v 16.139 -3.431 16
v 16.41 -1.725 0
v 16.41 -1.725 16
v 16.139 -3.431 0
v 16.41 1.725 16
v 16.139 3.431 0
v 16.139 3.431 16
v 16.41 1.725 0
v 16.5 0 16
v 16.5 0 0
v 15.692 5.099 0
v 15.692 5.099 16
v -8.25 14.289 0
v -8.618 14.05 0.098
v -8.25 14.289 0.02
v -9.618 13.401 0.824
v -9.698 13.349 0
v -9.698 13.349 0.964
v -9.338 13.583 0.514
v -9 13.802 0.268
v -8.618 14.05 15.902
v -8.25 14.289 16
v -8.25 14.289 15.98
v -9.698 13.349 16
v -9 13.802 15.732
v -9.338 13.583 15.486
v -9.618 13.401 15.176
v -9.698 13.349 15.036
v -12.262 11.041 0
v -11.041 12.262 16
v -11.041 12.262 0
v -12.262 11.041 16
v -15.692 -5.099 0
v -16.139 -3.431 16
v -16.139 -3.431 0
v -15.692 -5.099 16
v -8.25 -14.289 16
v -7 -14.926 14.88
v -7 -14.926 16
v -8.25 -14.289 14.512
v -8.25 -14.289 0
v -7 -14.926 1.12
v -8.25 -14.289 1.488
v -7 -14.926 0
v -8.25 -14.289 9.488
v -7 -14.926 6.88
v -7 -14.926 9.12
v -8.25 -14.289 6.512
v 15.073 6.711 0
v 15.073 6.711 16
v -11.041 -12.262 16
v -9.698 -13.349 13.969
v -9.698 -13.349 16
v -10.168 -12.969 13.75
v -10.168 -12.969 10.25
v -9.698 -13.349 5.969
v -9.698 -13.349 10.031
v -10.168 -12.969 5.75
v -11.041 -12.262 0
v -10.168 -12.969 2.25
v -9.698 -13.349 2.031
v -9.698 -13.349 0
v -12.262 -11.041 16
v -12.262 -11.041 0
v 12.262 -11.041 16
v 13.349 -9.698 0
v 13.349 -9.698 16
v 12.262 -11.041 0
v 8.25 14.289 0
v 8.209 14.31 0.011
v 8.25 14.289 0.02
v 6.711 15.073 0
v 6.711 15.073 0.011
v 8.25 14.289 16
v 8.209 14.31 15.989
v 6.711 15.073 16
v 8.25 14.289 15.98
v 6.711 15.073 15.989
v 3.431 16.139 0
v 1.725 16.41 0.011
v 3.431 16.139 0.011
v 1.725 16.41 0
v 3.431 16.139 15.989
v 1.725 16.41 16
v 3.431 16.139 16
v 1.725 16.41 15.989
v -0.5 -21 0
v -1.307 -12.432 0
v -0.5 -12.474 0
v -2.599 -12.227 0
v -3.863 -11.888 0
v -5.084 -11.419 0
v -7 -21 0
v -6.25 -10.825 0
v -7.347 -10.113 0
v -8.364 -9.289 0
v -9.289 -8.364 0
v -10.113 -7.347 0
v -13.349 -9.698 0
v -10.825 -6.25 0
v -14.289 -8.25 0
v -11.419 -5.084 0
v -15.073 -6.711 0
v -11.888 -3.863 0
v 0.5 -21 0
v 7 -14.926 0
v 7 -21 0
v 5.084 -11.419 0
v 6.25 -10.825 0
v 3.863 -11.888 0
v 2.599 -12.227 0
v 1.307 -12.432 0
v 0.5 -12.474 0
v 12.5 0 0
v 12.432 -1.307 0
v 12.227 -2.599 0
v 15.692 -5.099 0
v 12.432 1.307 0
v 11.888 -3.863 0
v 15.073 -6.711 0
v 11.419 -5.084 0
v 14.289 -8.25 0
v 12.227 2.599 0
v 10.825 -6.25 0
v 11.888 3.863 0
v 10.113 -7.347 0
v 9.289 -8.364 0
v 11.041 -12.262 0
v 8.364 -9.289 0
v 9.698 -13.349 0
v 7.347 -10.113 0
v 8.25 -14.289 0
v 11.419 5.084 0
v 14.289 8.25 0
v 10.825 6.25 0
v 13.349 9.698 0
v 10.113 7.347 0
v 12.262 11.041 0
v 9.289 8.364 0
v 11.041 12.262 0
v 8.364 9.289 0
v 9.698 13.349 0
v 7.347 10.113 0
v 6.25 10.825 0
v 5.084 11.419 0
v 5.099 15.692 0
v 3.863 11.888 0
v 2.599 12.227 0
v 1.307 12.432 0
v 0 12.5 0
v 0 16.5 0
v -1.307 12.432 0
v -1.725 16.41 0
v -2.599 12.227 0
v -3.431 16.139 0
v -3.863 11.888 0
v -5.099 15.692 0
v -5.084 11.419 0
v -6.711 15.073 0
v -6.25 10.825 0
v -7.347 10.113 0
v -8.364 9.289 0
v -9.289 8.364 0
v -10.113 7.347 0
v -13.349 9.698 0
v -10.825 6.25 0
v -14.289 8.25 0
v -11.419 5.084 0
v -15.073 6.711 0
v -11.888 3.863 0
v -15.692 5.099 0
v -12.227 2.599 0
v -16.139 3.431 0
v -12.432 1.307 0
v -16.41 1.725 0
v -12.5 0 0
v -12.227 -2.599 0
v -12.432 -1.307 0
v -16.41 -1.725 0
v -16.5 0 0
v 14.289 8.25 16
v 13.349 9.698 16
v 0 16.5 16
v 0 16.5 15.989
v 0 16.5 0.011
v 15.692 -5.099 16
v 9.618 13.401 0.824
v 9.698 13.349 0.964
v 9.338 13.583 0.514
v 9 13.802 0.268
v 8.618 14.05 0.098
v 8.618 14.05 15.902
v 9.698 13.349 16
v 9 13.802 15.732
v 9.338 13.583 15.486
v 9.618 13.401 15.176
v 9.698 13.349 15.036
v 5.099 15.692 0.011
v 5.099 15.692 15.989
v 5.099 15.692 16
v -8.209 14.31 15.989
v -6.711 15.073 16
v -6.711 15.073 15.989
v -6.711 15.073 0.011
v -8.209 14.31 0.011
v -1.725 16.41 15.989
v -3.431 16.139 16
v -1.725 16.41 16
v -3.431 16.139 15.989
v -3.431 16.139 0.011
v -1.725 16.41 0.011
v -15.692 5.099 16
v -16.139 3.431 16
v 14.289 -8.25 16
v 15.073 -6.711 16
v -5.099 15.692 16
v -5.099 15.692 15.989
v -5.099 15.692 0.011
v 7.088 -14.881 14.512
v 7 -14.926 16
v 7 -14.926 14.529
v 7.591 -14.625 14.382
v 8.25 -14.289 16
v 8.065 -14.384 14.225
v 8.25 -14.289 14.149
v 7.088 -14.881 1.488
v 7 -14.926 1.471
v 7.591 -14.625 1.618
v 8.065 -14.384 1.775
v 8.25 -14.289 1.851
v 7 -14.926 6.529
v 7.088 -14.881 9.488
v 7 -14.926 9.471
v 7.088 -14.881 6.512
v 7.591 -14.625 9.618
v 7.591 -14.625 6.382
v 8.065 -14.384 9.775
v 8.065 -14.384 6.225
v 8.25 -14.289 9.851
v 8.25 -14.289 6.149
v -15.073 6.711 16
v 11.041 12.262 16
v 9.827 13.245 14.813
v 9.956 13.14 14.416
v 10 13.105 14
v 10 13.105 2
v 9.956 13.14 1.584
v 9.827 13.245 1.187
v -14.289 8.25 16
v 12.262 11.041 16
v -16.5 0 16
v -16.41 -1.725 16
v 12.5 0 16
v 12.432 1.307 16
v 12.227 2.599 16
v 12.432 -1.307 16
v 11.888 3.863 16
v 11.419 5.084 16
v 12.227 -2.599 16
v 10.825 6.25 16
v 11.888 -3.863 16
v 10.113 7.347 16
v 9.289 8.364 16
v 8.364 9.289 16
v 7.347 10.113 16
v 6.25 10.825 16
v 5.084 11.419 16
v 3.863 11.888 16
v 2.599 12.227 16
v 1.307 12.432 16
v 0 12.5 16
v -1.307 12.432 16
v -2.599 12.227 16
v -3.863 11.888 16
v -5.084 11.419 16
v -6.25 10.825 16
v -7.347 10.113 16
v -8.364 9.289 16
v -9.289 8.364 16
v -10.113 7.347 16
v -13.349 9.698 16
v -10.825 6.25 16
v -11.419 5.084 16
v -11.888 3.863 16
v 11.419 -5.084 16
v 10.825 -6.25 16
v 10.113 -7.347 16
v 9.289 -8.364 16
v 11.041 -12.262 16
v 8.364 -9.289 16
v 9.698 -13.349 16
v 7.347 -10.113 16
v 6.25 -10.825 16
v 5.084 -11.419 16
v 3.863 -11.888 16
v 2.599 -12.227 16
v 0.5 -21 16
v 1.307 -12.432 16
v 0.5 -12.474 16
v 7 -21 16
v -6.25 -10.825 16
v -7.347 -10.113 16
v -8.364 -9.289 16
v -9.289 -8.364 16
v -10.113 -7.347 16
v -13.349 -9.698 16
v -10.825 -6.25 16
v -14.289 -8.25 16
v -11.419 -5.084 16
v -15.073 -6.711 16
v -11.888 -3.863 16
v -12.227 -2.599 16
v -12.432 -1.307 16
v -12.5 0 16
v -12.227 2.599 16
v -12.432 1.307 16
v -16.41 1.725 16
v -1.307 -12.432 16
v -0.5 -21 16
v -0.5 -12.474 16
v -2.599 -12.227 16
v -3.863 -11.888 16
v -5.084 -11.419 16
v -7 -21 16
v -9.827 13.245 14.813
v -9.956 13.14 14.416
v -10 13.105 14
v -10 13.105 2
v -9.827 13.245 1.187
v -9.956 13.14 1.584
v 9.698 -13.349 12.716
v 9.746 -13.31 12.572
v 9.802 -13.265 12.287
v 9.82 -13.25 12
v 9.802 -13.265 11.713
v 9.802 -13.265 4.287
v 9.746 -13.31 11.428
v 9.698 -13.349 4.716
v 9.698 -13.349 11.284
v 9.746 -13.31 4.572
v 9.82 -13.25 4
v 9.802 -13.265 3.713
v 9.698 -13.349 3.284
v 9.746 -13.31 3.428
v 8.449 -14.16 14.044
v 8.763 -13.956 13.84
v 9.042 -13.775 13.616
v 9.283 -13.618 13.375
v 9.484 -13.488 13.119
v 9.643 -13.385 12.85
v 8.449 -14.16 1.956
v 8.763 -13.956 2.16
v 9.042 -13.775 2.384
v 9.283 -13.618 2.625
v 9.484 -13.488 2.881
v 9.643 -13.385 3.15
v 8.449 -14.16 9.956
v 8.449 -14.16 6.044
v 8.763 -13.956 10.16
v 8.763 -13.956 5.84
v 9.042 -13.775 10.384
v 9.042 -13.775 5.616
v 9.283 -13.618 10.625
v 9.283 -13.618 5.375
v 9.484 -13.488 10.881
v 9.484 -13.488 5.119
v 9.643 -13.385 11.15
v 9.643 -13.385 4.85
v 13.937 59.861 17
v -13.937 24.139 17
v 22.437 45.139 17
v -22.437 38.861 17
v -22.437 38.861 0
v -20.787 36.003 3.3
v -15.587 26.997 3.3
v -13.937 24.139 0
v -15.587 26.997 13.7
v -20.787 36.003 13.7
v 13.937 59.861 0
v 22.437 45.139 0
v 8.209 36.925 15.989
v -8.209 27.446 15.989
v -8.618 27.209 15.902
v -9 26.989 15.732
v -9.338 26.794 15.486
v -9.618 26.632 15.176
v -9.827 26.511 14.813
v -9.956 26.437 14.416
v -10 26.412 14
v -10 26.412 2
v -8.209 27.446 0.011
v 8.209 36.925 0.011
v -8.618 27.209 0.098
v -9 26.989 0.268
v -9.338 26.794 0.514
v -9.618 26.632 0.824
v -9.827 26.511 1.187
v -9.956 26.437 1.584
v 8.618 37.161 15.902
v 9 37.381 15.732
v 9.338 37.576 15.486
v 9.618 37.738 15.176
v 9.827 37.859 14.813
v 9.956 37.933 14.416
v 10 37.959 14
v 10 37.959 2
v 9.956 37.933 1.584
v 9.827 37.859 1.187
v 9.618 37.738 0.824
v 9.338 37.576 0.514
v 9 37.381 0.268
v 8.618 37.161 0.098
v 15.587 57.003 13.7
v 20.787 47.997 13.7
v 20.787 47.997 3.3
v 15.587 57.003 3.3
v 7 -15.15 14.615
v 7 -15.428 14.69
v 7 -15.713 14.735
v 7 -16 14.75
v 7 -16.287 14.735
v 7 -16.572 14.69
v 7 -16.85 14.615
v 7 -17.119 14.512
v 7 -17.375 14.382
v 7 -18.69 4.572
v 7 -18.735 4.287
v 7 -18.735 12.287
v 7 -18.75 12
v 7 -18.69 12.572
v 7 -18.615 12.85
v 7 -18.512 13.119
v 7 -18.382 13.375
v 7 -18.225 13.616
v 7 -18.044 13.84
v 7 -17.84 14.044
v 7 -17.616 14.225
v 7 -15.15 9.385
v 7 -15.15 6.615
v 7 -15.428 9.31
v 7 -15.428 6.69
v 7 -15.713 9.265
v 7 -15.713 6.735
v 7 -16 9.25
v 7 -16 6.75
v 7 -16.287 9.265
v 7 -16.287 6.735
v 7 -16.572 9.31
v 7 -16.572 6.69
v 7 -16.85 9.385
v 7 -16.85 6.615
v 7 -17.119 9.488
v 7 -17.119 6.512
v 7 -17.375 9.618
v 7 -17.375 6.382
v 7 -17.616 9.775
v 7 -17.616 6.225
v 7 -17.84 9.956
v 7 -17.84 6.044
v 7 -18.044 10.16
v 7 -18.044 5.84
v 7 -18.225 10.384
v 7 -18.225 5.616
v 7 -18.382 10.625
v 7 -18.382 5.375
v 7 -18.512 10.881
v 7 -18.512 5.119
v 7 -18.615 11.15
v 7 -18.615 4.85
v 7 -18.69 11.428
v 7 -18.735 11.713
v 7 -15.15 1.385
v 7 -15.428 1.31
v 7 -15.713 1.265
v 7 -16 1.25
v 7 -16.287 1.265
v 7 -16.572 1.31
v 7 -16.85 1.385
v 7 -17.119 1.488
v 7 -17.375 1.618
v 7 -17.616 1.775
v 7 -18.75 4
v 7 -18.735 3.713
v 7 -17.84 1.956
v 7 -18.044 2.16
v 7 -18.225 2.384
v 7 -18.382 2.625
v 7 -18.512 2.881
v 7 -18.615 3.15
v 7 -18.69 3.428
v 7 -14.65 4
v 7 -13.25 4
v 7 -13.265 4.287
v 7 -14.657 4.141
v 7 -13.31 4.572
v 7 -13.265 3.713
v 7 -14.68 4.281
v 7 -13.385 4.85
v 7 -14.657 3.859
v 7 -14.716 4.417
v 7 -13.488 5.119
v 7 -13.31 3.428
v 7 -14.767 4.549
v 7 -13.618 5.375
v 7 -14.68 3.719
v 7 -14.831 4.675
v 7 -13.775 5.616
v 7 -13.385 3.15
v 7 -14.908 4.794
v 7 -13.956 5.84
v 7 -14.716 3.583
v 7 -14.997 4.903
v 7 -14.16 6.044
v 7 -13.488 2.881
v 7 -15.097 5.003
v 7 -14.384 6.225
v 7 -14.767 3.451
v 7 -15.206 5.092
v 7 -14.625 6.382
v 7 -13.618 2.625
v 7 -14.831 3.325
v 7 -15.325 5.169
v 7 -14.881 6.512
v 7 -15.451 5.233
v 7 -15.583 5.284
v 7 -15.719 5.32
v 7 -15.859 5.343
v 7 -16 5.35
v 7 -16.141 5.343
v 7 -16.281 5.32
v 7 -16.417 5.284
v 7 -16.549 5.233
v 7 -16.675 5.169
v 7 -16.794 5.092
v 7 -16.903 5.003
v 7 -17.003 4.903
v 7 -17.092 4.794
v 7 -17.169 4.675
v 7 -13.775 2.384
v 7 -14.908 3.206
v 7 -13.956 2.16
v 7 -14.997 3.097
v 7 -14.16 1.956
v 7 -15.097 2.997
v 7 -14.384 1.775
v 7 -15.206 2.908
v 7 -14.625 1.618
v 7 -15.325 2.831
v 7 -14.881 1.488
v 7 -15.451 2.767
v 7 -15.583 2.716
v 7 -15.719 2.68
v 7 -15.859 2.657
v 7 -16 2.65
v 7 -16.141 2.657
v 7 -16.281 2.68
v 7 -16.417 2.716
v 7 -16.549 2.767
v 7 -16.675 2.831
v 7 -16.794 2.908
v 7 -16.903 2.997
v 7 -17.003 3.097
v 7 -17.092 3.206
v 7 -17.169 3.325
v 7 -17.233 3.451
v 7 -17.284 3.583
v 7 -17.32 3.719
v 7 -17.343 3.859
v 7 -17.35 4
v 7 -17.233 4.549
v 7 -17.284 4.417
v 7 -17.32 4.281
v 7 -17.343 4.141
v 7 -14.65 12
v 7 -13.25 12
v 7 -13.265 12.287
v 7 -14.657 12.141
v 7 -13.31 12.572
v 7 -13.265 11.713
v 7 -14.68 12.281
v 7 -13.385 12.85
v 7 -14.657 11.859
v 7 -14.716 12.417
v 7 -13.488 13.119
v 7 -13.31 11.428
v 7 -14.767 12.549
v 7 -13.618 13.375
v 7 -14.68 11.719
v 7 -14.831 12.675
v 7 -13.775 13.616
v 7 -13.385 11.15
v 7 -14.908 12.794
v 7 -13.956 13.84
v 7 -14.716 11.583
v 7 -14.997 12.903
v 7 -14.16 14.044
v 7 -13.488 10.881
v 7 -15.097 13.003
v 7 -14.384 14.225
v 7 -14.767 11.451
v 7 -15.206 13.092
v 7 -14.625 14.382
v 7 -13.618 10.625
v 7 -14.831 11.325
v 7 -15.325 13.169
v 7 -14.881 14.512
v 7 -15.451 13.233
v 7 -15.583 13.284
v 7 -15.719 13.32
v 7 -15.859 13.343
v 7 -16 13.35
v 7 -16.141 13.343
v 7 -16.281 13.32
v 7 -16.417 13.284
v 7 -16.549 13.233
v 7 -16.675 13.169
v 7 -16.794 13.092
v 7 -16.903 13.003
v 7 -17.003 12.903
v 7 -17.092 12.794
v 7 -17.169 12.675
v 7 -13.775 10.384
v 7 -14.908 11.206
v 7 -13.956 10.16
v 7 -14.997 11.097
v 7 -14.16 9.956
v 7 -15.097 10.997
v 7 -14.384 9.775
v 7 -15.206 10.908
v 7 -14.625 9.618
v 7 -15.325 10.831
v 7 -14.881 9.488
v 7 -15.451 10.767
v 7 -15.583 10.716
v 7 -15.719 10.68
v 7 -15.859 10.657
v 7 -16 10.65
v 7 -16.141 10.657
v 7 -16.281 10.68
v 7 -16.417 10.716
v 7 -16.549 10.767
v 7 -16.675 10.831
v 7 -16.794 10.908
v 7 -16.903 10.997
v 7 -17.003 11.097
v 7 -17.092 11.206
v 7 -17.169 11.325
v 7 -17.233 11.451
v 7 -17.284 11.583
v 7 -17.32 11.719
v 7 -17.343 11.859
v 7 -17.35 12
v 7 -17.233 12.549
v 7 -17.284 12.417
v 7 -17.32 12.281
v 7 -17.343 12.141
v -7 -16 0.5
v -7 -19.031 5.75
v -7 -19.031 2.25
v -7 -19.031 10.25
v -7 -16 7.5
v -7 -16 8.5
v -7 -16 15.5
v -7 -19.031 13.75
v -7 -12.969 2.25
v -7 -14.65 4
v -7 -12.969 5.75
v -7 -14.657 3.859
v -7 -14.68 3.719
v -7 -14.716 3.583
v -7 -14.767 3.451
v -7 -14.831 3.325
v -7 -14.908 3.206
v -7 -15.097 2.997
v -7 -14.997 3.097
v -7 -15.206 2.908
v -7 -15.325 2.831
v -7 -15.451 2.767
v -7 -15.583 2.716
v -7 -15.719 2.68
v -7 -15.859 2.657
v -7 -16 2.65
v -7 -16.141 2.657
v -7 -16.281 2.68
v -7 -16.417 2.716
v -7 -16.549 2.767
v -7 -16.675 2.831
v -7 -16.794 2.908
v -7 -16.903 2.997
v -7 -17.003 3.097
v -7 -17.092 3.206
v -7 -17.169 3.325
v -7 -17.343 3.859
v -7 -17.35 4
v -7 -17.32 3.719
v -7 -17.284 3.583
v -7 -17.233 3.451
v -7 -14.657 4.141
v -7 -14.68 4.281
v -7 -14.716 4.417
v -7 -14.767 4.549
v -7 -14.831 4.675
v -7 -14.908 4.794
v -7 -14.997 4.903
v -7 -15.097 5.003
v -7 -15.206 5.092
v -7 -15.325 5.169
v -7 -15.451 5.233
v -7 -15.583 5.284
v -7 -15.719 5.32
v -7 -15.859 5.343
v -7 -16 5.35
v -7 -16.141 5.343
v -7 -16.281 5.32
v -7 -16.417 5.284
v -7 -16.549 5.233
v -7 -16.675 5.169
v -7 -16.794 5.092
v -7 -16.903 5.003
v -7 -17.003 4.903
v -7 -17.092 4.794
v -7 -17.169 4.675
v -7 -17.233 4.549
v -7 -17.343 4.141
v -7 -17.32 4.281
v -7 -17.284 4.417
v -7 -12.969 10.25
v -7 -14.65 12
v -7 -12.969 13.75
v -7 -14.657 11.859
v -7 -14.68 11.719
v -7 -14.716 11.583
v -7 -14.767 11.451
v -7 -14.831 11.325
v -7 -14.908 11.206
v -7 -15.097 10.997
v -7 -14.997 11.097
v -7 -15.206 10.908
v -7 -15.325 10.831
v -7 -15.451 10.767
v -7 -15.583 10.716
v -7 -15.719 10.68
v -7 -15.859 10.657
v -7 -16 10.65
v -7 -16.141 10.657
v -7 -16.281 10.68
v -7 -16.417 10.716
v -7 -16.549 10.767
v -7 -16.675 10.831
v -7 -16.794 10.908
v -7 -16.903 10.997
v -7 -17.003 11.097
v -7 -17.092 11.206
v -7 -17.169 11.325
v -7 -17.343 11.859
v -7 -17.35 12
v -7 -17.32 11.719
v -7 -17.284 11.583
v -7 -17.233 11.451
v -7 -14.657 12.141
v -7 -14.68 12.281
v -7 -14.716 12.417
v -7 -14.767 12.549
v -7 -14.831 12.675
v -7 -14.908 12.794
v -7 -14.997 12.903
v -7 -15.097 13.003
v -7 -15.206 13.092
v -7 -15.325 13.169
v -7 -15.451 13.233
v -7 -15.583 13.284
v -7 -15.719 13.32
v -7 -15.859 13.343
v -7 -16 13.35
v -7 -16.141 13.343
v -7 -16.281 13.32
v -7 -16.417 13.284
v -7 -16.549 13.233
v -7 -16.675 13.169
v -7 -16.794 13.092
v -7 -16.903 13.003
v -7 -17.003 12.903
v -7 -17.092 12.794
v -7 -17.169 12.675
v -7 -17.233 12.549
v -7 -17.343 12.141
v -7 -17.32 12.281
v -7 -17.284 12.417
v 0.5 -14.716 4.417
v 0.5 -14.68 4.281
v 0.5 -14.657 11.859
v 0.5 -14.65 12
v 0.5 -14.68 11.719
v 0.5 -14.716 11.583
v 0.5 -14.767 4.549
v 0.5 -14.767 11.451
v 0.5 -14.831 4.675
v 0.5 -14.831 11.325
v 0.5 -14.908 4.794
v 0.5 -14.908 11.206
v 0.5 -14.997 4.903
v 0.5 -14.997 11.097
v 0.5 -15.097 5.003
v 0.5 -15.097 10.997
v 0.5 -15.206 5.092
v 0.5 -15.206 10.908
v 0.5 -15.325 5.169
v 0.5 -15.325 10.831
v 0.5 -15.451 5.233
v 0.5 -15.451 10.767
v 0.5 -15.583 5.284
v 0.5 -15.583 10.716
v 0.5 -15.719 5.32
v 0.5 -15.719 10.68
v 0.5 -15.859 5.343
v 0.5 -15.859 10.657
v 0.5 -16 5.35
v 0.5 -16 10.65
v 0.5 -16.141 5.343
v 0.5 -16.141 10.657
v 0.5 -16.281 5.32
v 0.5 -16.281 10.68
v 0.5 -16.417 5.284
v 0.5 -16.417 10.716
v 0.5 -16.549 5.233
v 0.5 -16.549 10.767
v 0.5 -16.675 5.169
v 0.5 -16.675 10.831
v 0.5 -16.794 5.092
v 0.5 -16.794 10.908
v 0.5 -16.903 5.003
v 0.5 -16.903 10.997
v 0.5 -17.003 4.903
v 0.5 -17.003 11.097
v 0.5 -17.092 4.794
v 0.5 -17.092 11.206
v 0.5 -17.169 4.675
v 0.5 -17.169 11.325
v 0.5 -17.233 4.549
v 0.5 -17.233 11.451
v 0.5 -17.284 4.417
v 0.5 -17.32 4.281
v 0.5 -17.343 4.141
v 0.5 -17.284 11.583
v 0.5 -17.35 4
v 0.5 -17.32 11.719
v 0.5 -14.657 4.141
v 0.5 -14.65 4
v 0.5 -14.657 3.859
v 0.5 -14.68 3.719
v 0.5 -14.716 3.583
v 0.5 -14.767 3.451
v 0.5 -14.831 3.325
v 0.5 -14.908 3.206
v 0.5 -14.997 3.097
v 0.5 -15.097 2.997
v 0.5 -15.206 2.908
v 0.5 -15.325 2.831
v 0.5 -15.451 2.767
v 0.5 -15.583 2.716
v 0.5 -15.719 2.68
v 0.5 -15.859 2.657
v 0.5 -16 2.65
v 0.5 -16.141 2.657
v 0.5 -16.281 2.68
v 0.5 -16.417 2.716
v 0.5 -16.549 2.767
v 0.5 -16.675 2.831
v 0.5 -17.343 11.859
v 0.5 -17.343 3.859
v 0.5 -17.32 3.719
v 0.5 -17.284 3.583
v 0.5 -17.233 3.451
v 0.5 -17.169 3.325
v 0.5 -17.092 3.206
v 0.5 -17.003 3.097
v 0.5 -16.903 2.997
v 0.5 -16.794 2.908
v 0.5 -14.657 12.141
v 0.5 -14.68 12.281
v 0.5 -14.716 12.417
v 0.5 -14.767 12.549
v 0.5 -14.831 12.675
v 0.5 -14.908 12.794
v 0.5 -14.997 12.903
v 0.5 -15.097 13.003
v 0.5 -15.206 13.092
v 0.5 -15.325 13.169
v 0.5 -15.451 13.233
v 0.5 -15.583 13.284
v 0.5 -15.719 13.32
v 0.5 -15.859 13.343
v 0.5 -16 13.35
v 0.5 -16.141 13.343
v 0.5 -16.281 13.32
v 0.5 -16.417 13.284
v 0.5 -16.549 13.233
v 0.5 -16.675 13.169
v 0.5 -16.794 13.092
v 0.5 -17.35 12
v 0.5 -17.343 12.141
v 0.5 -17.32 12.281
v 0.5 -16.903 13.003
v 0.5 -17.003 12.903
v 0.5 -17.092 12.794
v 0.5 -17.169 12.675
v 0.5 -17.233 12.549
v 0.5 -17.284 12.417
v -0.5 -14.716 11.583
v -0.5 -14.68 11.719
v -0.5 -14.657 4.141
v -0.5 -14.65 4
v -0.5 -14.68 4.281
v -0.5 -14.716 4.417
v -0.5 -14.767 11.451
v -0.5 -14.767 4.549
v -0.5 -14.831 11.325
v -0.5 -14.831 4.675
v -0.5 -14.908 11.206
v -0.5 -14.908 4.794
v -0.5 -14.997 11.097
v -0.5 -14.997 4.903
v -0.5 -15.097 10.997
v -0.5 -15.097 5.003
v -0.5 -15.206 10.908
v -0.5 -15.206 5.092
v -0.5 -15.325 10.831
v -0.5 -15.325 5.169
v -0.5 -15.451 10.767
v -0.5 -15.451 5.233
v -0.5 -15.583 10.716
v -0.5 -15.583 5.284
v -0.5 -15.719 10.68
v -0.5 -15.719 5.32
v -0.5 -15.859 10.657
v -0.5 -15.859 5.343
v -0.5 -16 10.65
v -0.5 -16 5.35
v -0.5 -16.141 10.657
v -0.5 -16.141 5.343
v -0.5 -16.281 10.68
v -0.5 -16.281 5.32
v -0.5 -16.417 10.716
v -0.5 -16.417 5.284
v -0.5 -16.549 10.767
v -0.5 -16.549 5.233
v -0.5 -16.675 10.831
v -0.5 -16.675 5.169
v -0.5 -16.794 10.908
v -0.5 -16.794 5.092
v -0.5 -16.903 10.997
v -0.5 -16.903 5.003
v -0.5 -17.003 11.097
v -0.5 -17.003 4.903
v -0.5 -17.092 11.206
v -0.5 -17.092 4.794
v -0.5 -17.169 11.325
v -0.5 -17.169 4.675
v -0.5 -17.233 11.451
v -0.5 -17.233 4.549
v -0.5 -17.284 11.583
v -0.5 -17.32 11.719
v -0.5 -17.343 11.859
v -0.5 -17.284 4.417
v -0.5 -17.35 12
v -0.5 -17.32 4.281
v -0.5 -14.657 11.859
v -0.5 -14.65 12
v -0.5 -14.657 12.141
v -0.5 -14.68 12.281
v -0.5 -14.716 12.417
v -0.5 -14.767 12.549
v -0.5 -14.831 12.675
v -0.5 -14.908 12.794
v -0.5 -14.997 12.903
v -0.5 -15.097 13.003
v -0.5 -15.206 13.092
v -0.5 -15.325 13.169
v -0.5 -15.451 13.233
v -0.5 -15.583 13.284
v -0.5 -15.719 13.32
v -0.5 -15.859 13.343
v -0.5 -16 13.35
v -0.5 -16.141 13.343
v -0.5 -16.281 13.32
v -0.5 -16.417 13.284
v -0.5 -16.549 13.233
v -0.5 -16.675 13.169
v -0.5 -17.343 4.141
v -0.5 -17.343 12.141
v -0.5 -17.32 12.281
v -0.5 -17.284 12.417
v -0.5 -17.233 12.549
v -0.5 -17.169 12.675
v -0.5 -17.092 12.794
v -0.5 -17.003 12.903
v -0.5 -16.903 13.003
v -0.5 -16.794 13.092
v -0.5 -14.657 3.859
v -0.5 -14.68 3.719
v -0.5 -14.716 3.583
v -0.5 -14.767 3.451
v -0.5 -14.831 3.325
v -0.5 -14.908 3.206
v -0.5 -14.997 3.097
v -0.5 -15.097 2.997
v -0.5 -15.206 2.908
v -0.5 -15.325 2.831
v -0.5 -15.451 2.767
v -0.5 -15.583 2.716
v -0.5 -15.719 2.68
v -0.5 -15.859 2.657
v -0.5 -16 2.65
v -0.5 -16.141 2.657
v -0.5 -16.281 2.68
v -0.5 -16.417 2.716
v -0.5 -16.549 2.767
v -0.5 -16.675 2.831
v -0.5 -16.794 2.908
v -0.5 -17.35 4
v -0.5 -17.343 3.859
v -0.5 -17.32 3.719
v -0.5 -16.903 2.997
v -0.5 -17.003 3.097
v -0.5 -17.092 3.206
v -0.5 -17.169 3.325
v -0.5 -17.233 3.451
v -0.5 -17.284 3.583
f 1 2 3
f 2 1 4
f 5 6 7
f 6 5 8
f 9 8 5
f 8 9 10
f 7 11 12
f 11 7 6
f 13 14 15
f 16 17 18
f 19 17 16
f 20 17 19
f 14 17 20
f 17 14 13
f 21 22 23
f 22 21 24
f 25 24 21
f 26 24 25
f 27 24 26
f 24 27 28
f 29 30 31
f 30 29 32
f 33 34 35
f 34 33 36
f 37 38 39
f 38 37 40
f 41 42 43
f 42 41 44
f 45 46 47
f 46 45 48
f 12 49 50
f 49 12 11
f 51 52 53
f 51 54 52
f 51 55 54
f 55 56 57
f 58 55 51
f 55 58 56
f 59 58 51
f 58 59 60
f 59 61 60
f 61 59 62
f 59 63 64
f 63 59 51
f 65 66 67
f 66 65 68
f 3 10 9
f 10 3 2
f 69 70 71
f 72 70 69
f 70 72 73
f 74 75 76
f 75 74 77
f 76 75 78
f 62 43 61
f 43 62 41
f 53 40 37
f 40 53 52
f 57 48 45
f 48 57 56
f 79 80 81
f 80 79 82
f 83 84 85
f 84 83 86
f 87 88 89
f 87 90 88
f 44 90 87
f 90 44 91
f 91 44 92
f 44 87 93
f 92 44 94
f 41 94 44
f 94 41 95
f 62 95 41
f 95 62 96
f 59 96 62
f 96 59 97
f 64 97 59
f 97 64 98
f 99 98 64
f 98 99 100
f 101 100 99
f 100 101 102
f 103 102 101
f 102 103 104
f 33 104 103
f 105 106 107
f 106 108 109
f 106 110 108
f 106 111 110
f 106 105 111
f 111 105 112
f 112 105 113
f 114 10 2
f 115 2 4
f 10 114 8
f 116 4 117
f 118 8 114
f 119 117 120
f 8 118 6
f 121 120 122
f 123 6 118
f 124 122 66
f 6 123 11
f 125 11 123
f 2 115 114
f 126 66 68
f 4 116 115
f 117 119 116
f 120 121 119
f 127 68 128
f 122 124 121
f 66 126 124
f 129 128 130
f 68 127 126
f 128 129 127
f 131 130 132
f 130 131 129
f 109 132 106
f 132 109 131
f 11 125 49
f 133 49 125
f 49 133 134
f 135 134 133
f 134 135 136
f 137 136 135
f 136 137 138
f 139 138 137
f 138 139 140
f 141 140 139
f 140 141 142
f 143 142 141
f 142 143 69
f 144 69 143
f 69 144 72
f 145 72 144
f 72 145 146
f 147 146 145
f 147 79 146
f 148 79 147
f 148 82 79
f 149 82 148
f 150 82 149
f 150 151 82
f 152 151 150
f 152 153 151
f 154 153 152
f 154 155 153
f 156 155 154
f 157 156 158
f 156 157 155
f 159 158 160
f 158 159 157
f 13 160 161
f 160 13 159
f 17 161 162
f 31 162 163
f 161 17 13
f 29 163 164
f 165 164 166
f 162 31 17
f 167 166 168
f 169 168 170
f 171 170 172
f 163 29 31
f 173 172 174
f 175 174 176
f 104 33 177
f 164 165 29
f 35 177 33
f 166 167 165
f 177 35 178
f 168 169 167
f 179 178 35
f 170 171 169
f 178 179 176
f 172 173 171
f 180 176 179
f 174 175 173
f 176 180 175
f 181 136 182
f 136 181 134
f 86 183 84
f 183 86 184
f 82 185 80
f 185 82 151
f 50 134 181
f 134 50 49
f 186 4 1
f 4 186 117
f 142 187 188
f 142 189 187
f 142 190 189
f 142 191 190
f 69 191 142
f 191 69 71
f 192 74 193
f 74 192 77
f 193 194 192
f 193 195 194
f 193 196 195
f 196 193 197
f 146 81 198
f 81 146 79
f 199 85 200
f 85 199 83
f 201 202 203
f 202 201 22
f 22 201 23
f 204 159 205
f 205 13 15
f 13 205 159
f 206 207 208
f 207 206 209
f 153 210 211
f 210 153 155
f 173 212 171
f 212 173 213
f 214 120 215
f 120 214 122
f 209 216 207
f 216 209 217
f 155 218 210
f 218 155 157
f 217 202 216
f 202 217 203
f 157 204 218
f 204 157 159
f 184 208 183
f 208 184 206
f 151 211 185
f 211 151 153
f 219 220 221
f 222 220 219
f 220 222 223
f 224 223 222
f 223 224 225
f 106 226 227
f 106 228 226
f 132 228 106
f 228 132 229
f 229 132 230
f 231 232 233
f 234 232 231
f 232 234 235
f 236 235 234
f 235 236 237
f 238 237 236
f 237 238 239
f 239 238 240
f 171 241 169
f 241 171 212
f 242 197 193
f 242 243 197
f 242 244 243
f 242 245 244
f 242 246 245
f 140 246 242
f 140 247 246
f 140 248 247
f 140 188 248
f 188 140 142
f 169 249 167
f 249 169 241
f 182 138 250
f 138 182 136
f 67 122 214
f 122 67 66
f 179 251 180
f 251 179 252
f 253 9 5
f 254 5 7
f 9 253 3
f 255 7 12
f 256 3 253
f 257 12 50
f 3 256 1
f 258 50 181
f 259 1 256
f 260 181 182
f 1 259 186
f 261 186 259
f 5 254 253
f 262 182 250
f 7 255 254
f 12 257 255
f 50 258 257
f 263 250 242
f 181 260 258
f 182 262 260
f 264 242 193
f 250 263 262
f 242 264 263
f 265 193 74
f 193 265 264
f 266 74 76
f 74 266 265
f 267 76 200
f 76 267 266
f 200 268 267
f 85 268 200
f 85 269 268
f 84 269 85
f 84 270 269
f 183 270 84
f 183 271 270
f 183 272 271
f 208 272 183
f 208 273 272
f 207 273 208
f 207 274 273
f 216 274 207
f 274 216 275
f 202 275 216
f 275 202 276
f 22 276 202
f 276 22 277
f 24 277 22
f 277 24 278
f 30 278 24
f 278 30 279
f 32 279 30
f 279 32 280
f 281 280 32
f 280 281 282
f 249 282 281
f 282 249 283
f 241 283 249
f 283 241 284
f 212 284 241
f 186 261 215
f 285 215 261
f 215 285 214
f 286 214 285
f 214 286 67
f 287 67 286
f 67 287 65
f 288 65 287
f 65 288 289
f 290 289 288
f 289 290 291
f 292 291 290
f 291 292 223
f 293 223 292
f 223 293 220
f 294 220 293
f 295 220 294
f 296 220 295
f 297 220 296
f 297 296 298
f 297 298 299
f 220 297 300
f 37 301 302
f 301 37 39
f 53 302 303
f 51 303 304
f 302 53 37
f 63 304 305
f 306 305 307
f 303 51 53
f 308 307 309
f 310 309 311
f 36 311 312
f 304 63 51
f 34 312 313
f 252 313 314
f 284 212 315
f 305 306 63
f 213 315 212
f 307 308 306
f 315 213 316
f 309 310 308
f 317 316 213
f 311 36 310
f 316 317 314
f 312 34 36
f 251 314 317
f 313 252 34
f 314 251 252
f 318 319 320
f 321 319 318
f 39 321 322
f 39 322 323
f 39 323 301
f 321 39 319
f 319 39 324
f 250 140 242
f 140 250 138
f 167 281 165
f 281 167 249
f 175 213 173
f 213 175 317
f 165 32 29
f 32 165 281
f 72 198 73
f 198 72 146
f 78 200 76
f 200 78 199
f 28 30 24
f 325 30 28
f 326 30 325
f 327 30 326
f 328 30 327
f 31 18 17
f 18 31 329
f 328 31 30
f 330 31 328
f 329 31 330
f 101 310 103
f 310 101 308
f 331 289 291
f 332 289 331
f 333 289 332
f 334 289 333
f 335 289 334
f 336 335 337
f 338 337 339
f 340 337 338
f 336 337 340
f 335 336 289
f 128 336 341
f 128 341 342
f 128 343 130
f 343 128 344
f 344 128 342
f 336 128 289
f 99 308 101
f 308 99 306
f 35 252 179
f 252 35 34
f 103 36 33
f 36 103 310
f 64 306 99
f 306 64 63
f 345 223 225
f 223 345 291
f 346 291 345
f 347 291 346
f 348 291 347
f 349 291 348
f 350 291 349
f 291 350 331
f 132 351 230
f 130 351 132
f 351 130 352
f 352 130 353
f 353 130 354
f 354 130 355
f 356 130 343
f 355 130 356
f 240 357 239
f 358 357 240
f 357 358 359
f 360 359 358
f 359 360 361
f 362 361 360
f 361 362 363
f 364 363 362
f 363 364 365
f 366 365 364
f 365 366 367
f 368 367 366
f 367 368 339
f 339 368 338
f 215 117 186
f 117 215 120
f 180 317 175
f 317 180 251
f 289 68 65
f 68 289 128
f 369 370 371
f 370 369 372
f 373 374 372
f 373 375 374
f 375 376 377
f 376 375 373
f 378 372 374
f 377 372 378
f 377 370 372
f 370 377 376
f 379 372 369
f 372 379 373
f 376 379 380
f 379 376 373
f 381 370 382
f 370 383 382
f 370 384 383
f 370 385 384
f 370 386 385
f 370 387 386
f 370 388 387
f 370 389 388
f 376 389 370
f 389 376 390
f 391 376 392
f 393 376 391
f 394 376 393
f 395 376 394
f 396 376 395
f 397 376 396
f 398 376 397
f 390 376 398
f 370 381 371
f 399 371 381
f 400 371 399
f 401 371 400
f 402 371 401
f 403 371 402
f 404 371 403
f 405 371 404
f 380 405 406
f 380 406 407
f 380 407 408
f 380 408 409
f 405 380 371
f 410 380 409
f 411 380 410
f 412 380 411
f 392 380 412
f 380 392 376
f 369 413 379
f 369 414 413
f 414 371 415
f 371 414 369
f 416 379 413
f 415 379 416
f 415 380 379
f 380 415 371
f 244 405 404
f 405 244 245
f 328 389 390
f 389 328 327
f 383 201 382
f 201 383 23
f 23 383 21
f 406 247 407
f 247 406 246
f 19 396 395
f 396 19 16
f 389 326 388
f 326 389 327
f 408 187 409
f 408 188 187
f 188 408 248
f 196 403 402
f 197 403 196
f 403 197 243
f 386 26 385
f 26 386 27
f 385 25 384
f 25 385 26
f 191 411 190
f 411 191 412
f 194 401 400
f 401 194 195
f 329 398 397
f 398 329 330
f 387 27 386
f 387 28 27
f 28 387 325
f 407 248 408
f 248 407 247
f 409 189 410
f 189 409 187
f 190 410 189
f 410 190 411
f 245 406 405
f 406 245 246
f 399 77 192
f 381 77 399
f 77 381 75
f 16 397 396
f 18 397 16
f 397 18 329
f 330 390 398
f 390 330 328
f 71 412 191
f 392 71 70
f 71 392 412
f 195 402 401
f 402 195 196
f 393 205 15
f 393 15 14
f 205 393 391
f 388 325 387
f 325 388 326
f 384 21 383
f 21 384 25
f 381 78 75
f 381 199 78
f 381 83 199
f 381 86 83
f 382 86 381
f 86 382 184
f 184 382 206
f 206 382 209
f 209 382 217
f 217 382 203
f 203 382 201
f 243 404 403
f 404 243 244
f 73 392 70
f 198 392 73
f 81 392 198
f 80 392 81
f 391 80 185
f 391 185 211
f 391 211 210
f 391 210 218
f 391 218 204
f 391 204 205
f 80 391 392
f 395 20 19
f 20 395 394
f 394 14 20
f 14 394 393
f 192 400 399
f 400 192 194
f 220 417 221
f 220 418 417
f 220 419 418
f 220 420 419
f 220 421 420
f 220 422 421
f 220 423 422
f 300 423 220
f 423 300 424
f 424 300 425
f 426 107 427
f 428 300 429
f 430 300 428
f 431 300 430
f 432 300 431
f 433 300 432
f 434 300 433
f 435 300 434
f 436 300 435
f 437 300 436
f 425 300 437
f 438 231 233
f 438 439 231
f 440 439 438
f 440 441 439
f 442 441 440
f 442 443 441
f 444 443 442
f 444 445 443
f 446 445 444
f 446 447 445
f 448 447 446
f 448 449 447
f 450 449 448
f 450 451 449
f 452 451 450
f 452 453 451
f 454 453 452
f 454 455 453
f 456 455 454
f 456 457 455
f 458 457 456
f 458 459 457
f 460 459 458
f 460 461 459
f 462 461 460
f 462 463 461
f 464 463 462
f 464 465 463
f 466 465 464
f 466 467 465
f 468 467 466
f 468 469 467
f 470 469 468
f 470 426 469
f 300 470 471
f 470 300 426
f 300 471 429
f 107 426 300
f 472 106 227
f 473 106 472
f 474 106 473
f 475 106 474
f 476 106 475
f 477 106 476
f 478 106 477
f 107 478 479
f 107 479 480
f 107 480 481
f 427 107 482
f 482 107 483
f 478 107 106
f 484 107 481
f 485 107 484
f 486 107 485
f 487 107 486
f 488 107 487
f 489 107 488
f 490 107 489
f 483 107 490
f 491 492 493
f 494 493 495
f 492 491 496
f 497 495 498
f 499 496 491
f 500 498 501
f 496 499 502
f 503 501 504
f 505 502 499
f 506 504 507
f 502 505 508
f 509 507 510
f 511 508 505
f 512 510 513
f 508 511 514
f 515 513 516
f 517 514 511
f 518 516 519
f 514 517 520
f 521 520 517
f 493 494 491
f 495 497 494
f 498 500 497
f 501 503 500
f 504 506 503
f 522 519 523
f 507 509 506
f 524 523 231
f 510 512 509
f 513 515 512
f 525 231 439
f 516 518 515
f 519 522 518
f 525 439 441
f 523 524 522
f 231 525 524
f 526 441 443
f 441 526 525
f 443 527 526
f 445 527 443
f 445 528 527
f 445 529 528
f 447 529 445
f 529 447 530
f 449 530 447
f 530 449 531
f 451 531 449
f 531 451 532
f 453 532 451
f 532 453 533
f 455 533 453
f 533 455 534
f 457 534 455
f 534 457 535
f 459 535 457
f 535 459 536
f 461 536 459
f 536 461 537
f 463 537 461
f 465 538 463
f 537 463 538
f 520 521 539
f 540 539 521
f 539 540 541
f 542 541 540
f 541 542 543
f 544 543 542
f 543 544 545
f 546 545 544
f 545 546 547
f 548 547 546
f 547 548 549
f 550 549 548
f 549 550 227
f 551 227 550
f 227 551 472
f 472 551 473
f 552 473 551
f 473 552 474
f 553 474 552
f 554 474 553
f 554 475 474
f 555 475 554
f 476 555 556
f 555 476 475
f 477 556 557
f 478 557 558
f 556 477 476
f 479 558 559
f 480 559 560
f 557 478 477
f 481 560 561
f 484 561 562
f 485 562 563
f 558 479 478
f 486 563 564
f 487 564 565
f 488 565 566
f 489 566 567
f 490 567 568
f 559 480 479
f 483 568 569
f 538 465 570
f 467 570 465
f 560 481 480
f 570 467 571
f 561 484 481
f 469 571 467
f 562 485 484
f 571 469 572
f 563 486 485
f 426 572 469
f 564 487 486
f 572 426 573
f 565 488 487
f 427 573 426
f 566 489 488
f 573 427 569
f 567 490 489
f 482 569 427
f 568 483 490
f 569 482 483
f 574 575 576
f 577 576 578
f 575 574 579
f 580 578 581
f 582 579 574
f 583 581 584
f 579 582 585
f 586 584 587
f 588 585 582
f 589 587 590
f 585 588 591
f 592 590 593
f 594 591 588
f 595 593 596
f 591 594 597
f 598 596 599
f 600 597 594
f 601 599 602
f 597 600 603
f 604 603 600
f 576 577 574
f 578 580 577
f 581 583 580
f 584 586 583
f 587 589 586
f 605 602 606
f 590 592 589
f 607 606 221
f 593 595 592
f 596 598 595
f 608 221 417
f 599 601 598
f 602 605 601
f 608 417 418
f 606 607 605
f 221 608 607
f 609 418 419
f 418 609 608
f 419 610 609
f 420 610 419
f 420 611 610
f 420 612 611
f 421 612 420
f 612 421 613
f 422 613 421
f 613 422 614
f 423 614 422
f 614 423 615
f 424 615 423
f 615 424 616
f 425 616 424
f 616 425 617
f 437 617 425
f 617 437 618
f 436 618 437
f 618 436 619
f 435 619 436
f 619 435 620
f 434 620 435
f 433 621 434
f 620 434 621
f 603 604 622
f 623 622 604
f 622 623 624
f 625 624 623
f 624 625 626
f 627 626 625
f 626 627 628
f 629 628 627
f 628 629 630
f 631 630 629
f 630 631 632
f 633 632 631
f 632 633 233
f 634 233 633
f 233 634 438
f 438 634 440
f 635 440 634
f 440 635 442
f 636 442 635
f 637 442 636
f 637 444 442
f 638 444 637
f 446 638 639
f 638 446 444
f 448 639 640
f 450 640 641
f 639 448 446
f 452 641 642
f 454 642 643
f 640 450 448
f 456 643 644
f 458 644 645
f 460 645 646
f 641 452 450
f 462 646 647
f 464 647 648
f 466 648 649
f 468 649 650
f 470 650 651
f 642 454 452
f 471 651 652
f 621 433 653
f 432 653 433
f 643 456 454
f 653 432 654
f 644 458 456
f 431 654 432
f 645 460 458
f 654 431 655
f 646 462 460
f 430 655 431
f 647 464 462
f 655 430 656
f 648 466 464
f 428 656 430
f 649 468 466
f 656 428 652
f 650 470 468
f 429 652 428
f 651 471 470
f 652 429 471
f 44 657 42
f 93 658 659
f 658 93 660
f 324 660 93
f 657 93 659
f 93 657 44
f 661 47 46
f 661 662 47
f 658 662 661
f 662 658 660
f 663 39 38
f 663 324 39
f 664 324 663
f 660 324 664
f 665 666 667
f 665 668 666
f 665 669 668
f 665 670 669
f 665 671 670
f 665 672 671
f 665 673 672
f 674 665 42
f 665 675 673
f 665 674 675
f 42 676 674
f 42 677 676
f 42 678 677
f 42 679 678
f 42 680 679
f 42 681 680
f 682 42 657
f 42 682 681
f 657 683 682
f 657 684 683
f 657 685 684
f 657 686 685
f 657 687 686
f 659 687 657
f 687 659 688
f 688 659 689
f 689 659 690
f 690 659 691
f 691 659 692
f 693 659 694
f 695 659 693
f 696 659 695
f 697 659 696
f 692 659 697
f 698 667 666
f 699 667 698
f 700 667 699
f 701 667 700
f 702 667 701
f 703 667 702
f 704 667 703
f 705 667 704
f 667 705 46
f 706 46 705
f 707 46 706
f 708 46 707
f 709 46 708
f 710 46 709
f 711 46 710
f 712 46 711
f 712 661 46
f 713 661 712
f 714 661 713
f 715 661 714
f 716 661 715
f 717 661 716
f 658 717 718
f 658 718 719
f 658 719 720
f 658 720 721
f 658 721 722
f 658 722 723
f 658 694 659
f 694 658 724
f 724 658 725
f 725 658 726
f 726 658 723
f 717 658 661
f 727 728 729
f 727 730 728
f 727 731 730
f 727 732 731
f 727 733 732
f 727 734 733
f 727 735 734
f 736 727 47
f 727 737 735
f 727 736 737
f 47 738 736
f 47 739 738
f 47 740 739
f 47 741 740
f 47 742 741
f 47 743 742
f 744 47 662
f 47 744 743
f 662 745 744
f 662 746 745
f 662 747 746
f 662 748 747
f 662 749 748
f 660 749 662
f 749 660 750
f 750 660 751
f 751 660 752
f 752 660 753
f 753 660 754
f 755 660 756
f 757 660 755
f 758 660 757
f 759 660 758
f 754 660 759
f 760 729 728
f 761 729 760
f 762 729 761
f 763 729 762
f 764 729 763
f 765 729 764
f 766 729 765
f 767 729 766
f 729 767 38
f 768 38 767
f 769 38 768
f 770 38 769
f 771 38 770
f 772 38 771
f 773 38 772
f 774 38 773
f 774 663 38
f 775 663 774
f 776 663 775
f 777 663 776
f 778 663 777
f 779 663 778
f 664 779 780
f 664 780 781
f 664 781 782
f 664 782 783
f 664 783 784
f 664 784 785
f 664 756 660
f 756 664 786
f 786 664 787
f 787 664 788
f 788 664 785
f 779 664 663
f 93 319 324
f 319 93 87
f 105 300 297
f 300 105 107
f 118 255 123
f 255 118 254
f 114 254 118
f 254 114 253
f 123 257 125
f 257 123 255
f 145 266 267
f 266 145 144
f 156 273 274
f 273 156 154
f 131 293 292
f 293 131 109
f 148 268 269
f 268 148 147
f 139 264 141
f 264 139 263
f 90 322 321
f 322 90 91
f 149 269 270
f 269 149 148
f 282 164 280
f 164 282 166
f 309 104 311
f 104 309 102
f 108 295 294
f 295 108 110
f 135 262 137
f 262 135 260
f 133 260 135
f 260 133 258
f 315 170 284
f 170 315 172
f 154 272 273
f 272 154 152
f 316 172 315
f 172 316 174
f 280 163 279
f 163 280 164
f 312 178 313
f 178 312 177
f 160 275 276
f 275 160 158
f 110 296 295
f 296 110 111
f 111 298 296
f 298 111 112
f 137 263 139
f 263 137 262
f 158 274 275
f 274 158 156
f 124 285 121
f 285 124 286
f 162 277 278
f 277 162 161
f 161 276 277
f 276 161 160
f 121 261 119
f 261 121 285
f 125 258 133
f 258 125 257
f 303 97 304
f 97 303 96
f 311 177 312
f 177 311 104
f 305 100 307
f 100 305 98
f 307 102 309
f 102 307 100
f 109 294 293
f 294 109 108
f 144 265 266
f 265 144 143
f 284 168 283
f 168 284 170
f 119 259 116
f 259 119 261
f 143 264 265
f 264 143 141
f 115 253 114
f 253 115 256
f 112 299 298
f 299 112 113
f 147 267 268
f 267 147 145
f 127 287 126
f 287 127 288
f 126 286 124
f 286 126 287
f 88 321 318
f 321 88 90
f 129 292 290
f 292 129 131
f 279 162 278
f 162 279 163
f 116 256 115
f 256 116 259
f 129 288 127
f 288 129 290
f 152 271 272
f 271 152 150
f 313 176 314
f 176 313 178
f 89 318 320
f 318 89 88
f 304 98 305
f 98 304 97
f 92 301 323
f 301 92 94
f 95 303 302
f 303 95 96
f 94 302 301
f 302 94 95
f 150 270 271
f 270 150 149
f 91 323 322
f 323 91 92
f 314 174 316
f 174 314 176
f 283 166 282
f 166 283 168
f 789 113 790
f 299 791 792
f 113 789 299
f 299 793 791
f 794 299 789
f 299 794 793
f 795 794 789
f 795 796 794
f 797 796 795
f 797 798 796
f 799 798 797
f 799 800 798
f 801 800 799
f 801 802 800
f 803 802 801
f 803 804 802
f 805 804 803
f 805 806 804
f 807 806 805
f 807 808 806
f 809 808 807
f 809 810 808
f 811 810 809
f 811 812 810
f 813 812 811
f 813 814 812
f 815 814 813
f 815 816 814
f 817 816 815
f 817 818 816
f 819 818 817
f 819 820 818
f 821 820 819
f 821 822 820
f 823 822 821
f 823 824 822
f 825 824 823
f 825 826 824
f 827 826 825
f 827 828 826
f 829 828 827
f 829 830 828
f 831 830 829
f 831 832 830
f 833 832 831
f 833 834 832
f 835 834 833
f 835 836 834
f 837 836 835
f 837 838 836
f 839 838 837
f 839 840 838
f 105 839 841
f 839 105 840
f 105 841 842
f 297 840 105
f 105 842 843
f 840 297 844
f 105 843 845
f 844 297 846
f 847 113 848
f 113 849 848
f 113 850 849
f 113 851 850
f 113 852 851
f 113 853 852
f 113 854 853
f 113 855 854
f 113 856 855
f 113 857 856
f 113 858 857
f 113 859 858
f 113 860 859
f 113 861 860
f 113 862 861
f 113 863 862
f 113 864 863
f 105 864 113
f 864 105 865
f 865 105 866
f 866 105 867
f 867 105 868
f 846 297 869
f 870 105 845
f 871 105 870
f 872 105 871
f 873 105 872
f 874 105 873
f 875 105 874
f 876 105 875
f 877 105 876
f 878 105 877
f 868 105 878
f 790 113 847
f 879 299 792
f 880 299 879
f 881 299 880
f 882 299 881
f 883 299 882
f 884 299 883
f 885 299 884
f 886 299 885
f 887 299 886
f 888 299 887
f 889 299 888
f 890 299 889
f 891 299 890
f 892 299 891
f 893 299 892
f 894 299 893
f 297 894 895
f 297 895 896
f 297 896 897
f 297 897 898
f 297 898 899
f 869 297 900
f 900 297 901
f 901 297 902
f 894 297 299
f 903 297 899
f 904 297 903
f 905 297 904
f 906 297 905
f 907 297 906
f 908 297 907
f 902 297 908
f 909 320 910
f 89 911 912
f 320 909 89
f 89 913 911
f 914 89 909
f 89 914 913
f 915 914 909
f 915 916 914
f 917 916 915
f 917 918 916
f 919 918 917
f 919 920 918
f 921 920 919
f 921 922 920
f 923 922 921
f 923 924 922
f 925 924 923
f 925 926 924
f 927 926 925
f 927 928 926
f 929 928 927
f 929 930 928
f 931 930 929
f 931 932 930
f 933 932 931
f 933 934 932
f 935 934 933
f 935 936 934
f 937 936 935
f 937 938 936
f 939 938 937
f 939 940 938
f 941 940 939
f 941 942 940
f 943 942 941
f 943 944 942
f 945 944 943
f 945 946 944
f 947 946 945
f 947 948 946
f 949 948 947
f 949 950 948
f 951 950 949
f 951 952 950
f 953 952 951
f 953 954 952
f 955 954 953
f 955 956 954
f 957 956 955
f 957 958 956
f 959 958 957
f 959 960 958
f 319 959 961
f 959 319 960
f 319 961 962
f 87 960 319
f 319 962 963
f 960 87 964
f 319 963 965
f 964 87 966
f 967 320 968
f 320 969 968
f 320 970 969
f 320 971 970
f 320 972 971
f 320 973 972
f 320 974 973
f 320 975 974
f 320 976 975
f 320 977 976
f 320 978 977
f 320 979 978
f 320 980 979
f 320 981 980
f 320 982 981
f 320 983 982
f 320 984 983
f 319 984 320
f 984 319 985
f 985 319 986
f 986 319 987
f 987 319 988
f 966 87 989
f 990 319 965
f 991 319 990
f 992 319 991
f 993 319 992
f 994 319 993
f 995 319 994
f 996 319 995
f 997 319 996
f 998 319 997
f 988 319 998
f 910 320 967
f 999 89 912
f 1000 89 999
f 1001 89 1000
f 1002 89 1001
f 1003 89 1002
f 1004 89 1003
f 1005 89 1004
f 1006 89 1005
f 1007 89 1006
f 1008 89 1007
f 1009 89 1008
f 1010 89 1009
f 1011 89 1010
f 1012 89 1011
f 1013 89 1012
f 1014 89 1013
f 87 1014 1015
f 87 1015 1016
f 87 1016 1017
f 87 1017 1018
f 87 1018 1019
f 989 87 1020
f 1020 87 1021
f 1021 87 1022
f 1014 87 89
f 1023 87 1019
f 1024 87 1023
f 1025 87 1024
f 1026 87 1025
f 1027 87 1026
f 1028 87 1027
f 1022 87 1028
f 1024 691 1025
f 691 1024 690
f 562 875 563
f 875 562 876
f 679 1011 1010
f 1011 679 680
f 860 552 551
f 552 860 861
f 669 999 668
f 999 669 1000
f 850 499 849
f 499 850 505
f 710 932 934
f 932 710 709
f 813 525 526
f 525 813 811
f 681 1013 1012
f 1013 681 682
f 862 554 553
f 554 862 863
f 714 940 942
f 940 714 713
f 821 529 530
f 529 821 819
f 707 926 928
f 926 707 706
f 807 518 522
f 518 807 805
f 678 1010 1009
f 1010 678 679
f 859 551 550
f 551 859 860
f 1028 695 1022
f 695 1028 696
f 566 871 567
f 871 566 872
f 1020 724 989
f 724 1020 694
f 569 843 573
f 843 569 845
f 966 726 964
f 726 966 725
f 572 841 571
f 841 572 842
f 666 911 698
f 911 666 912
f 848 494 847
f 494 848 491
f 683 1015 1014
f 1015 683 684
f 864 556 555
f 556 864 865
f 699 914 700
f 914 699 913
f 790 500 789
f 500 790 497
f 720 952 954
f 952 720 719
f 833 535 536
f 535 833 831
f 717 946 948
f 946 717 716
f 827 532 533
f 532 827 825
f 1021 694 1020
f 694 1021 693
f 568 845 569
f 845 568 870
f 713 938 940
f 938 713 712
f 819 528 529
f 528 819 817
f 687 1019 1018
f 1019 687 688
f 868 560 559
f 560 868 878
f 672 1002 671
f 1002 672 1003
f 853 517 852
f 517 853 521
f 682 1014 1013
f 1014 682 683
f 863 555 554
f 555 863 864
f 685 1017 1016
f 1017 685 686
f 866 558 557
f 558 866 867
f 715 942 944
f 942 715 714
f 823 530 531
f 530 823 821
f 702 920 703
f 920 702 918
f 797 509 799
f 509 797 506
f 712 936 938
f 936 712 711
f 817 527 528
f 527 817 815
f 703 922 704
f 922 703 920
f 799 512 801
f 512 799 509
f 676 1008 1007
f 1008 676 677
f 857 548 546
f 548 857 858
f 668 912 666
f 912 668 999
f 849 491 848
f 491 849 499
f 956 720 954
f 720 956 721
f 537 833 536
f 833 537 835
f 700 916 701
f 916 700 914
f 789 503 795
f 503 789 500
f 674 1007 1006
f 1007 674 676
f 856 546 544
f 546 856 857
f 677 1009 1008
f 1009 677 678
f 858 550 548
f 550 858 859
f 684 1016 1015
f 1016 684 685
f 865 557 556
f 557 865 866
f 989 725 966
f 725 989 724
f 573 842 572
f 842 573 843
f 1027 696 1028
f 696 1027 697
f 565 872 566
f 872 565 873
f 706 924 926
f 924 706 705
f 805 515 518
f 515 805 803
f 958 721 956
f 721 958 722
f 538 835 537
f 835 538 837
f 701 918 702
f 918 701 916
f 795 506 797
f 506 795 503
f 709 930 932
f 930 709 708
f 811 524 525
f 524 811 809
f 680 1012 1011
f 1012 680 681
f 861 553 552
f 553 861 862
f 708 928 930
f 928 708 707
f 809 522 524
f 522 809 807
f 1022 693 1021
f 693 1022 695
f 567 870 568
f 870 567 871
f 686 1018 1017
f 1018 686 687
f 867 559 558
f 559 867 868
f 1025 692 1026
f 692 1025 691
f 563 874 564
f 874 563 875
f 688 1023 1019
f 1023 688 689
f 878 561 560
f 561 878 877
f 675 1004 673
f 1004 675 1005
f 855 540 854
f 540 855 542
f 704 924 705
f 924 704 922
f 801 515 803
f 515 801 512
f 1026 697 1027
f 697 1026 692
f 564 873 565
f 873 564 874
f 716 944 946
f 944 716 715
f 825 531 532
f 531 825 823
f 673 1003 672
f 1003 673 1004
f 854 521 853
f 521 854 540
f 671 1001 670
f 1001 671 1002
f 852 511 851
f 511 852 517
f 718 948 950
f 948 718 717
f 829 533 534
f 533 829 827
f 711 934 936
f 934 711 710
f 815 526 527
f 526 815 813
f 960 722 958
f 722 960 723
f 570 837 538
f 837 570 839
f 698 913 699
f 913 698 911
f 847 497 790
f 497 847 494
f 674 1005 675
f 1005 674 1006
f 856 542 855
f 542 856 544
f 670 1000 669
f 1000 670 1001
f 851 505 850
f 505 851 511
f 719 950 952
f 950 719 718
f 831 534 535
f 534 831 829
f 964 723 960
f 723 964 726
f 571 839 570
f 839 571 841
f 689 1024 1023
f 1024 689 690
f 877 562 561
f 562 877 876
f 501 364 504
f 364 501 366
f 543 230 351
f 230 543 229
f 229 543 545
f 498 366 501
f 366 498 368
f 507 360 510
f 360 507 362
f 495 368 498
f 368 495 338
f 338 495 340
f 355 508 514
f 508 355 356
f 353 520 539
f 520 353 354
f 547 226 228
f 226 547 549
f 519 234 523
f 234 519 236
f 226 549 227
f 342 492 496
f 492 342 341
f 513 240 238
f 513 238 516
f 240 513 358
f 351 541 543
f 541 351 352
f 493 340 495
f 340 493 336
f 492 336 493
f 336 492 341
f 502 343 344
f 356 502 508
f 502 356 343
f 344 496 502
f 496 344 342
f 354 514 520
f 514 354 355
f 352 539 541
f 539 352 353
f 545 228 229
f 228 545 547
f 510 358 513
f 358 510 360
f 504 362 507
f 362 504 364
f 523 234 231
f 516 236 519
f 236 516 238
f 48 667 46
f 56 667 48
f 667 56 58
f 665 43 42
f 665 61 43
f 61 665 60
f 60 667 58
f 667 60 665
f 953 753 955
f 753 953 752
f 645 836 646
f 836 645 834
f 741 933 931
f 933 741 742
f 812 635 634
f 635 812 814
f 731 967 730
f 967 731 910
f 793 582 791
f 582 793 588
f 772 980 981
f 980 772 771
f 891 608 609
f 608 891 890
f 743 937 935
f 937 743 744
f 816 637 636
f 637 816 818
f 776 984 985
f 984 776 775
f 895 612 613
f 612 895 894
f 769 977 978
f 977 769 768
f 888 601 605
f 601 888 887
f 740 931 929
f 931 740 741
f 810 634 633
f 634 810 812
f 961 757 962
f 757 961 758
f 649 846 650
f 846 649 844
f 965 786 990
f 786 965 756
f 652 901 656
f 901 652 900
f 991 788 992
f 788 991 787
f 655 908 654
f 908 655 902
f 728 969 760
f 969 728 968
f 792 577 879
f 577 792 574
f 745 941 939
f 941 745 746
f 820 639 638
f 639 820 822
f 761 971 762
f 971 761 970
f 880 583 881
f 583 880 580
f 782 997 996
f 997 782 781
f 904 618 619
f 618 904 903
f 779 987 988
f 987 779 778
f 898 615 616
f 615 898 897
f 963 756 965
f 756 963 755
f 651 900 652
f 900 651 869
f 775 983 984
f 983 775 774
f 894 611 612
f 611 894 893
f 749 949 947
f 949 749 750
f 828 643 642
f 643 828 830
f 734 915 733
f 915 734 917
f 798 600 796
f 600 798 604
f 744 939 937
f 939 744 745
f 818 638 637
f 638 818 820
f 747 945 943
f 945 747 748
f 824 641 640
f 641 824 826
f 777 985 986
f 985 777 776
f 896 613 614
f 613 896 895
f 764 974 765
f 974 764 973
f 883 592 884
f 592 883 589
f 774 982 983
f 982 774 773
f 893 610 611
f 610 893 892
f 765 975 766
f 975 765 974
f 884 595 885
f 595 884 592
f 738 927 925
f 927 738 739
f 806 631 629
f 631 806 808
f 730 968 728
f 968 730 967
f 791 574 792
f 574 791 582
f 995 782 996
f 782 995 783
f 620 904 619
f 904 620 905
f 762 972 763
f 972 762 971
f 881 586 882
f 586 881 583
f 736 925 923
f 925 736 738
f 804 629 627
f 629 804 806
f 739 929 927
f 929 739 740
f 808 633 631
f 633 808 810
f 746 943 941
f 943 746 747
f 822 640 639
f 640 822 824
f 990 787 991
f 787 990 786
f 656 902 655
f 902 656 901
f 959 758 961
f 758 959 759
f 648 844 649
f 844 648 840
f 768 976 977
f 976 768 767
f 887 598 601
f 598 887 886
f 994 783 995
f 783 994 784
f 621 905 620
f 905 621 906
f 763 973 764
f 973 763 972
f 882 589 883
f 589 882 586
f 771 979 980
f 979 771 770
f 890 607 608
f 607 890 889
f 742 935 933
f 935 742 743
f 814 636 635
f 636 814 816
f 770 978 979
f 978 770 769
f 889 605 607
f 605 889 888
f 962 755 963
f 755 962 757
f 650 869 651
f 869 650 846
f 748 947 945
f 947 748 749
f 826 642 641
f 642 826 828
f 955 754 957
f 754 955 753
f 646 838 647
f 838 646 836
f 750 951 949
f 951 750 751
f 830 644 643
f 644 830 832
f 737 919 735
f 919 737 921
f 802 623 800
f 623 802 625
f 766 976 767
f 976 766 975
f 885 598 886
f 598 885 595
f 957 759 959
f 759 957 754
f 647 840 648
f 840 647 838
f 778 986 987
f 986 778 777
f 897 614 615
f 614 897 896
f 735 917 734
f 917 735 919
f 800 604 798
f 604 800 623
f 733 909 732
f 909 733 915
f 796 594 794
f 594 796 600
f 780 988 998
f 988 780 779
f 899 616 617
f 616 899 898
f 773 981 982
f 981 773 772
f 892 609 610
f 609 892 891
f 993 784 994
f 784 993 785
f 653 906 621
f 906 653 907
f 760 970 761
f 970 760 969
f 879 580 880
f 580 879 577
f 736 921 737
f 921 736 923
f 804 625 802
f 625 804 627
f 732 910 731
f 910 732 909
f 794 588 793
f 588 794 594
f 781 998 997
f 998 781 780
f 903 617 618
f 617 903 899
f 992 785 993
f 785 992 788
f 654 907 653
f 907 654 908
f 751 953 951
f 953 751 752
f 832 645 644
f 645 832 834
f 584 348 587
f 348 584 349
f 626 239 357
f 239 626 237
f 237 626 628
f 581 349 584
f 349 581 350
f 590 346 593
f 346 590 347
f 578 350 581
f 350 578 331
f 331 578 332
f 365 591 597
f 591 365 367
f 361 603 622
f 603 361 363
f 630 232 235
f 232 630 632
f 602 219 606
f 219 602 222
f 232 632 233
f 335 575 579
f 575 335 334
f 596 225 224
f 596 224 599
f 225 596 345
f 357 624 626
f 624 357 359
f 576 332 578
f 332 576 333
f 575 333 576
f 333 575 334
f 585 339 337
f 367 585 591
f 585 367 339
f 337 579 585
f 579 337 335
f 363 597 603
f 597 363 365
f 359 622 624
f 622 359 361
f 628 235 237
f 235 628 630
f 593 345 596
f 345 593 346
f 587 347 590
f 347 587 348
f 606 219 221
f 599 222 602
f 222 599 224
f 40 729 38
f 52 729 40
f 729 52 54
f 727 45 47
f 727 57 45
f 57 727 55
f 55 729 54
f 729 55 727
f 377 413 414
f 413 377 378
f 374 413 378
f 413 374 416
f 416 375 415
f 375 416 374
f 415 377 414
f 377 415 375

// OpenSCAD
$fn=60;

difference(){
union(){
cylinder(d=33,h=16);
translate([0,42,8.5])rotate([0,0,30])
cube([42,17,17],center=true);
translate([-8,9,2])
minkowski(){
sphere(d=4,$fn=30);
cube(size=[16,32,12]);
}
translate([-7,-21,0]) cube(size=[14,8,16]);
}
translate([0,0,-1]) cylinder(d=25,h=22);
translate([-.5,-25,-1]) cube(size=[1,20,22]);

translate ([-10,-16,4])rotate([0,90,0])
cylinder(d=2.7,h=100);
translate ([7,-16,4])rotate([0,90,0])
cylinder(d=5.5,h=100);
translate ([-17,-16,4])rotate([0,90,0])
cylinder(d=7,h=10,$fn=6);

translate ([-10,-16,12])rotate([0,90,0])
cylinder(d=2.7,h=100);
translate ([7,-16,12])rotate([0,90,0])
cylinder(d=5.5,h=100);
translate ([-17,-16,12])rotate([0,90,0])
cylinder(d=7,h=10,$fn=6);

translate([0,60,15])rotate([-90,0,0])
cylinder(d=3,h=100);
translate([0,56,15])rotate([-90,0,0])
cylinder(d=6.5,h=10,$fn=6);

translate([0,90,0])cube([60,40,60],center=true);
translate([0,42,8.5])rotate([0,0,30])
cube([43,10.4,10.4],center=true);
}
